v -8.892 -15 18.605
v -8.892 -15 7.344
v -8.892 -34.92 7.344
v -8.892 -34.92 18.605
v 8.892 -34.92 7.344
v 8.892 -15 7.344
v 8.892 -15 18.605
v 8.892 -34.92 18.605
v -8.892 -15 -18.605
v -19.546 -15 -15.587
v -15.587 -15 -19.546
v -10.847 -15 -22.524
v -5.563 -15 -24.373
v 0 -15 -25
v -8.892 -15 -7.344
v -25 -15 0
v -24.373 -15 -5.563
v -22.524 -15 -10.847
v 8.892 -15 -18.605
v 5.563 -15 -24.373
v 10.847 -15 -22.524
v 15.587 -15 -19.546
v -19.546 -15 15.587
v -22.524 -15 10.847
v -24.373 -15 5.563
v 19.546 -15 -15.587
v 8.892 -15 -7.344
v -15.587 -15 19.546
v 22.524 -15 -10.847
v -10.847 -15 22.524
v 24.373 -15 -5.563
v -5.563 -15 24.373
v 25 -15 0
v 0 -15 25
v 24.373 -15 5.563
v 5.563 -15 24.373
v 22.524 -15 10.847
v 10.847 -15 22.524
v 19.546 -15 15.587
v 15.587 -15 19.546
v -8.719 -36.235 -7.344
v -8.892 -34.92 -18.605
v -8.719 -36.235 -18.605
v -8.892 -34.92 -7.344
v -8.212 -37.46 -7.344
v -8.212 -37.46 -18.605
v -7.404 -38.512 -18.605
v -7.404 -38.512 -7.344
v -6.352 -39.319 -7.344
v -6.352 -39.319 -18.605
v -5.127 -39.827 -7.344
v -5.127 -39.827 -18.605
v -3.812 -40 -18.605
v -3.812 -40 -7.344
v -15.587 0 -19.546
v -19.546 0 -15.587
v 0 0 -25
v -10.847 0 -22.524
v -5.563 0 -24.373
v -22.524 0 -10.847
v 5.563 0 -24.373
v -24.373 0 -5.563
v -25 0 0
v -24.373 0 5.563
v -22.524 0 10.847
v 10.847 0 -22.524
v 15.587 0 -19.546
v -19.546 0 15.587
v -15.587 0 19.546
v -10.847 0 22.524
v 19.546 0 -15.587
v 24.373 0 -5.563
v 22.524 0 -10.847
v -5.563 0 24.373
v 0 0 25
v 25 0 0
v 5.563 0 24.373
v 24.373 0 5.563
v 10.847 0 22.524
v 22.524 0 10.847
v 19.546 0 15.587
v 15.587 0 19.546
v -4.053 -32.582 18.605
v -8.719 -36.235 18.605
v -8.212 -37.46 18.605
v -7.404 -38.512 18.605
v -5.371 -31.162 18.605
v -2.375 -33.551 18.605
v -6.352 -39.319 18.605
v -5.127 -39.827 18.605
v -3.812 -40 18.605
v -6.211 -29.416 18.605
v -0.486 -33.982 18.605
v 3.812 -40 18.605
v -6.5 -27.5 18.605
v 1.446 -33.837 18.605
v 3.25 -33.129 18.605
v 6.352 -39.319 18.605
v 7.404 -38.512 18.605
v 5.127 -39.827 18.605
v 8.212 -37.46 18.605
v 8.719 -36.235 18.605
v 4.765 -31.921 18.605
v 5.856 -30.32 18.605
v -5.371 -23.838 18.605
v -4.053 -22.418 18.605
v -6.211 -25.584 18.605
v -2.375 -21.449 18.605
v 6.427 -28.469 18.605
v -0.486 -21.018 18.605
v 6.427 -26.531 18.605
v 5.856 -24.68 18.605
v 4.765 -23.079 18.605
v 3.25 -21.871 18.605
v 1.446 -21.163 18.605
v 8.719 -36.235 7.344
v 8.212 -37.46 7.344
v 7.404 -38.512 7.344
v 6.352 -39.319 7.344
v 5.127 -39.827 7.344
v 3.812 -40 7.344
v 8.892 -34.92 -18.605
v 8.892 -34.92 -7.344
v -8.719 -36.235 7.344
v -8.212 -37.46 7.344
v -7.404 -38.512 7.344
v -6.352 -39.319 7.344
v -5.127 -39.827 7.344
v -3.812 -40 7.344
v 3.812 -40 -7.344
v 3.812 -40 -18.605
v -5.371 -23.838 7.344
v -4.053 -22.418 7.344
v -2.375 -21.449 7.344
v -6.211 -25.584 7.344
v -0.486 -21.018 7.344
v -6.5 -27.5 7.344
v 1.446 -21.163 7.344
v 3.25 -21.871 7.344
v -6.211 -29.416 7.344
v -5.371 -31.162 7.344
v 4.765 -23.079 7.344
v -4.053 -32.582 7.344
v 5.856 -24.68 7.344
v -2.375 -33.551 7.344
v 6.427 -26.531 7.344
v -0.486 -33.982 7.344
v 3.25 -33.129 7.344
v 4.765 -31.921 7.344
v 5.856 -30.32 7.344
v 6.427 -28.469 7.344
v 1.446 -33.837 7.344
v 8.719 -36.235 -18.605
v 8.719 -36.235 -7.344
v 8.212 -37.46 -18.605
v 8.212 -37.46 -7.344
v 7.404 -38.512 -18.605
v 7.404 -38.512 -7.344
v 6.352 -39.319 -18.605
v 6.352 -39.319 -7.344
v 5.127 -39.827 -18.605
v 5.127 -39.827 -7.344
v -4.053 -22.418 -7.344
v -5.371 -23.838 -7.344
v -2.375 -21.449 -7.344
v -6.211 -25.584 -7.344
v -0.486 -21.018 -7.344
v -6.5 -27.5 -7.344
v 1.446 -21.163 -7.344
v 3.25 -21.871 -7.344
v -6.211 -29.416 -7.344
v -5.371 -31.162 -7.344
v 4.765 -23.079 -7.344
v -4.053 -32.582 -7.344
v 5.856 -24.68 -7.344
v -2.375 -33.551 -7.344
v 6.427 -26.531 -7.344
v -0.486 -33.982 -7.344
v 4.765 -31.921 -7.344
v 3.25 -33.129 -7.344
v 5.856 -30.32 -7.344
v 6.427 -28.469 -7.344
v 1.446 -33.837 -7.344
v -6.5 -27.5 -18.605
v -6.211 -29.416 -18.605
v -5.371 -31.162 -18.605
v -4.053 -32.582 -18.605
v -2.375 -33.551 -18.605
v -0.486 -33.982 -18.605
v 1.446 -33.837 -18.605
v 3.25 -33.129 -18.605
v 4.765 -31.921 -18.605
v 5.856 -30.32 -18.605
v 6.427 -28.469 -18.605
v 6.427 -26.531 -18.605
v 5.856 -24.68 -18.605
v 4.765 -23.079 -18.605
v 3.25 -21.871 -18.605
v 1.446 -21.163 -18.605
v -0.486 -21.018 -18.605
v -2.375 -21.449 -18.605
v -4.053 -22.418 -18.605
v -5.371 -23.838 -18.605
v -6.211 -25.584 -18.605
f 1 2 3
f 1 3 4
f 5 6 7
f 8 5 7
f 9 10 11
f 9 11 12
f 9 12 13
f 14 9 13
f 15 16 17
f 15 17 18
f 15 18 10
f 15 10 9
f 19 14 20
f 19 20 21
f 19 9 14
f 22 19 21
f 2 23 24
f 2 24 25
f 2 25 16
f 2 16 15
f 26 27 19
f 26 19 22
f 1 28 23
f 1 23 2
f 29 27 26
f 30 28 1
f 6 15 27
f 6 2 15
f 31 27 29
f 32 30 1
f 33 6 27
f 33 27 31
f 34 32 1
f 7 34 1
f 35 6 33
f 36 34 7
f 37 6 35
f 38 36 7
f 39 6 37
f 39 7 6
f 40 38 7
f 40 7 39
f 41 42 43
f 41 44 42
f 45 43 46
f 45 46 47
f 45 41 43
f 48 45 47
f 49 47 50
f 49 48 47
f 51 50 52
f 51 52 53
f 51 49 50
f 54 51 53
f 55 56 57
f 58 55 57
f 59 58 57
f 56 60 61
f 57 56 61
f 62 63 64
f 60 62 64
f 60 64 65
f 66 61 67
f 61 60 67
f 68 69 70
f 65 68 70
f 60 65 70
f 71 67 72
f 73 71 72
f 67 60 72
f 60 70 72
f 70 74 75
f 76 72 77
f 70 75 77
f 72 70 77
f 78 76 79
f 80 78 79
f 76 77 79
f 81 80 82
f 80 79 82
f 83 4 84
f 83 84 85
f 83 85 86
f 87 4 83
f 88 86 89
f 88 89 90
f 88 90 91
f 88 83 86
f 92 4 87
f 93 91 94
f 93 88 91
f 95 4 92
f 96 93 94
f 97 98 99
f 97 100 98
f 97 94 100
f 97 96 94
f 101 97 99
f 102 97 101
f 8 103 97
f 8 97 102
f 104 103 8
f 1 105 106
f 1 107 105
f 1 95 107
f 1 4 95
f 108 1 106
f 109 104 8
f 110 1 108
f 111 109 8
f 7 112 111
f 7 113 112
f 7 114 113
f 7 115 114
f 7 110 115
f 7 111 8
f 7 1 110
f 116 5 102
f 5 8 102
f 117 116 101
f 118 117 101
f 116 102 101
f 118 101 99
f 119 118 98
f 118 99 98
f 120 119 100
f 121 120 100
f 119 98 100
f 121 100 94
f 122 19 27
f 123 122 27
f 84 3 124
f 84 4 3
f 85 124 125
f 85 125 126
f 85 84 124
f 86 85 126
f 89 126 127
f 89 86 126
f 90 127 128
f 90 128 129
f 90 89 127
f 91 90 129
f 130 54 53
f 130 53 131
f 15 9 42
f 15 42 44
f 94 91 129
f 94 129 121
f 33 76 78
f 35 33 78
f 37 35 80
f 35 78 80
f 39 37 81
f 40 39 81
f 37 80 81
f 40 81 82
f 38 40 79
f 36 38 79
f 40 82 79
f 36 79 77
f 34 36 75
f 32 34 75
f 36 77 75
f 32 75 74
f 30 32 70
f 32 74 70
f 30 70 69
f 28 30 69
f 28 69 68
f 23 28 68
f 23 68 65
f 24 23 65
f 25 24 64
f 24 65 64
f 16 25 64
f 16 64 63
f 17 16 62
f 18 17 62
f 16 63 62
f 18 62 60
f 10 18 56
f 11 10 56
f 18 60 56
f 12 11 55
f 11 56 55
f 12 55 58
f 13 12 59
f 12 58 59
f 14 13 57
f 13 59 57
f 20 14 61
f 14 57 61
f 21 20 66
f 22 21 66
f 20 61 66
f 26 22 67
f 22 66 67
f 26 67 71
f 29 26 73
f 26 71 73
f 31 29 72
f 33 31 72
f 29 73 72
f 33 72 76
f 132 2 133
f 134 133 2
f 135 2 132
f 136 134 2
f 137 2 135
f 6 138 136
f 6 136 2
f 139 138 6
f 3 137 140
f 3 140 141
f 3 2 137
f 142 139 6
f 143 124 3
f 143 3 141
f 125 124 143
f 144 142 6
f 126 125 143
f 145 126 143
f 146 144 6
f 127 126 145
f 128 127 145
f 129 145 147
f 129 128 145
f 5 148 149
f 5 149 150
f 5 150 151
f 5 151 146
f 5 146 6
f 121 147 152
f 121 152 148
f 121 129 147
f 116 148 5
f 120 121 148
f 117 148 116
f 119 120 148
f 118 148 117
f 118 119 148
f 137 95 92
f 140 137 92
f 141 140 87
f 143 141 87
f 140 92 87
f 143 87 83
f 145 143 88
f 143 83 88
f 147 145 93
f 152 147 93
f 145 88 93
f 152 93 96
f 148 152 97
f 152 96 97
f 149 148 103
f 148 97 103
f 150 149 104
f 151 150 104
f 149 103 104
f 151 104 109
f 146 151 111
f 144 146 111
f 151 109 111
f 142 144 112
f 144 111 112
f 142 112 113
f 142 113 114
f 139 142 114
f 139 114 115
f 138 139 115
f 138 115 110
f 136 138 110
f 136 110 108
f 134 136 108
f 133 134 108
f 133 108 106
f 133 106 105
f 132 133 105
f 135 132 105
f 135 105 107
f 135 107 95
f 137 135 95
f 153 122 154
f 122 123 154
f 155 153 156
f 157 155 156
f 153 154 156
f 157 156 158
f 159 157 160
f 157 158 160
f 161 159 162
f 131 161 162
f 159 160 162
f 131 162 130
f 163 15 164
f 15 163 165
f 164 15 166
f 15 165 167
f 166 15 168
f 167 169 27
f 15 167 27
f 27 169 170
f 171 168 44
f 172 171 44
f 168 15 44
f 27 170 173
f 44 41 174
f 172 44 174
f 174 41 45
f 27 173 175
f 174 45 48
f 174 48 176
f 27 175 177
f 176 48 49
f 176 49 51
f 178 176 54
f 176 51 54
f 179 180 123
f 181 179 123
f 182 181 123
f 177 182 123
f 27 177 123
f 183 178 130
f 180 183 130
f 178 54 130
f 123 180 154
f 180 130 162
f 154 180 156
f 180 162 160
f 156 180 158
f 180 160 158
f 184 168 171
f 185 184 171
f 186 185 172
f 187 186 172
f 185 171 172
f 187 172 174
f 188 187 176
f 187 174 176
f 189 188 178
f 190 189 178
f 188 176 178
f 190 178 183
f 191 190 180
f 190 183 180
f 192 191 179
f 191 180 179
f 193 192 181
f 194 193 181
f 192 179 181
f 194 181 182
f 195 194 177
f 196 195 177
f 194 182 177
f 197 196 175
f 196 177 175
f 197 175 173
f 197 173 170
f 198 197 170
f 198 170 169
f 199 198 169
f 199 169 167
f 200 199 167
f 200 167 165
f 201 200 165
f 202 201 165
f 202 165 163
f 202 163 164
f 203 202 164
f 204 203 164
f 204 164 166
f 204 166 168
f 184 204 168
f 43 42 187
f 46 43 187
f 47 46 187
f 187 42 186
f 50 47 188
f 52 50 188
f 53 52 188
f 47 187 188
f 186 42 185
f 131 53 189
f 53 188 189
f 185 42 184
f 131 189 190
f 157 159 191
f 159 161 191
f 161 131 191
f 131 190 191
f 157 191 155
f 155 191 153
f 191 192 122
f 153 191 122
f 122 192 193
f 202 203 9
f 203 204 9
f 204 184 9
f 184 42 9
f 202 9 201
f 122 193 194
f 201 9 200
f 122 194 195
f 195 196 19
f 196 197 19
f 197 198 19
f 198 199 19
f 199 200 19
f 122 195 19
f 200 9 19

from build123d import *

# Parameters (mm, degrees)
F0_R     = 25
F1_DEPTH = 15
F2_W     = 17.784364
F2_H     = 37.209642
F3_DEPTH = 25
F6_D     = 13
F4_W     = 17.784364
F4_H     = 14.687386
F7_DEPTH = 25
F8_R     = 5.08


with BuildPart() as f1:
    # F0 (on Front) → F1 (new body)
    with BuildSketch(Plane.XZ):
        Circle(F0_R)
    extrude(amount=F1_DEPTH)

    # F2 (on face) → F3 (join)
    with BuildSketch(Plane.XZ.offset(15)):
        Rectangle(F2_W, F2_H)
    extrude(amount=F3_DEPTH)

    # F6 (through all)
    with Locations(Plane(origin=(0, 0, -18.604821), x_dir=(1, 0, 0), z_dir=(0, 0, -1))):
        with Locations((0, 27.5)):
            Hole(F6_D / 2)

    # F4 (on face) → F7 (cut)
    with BuildSketch(Plane.XZ.offset(40)):
        Rectangle(F4_W, F4_H)
    extrude(amount=-F7_DEPTH, mode=Mode.SUBTRACT)

    # F8
    f8_edges = [f1.edges().sort_by_distance(p)[0] for p in [
        (8.892182, -40, -12.974257),
        (8.892182, -40, 12.974257),
        (-8.892182, -40, 12.974257),
        (-8.892182, -40, -12.974257),
    ]]
    fillet(f8_edges, radius=F8_R)


solid = f1.part
